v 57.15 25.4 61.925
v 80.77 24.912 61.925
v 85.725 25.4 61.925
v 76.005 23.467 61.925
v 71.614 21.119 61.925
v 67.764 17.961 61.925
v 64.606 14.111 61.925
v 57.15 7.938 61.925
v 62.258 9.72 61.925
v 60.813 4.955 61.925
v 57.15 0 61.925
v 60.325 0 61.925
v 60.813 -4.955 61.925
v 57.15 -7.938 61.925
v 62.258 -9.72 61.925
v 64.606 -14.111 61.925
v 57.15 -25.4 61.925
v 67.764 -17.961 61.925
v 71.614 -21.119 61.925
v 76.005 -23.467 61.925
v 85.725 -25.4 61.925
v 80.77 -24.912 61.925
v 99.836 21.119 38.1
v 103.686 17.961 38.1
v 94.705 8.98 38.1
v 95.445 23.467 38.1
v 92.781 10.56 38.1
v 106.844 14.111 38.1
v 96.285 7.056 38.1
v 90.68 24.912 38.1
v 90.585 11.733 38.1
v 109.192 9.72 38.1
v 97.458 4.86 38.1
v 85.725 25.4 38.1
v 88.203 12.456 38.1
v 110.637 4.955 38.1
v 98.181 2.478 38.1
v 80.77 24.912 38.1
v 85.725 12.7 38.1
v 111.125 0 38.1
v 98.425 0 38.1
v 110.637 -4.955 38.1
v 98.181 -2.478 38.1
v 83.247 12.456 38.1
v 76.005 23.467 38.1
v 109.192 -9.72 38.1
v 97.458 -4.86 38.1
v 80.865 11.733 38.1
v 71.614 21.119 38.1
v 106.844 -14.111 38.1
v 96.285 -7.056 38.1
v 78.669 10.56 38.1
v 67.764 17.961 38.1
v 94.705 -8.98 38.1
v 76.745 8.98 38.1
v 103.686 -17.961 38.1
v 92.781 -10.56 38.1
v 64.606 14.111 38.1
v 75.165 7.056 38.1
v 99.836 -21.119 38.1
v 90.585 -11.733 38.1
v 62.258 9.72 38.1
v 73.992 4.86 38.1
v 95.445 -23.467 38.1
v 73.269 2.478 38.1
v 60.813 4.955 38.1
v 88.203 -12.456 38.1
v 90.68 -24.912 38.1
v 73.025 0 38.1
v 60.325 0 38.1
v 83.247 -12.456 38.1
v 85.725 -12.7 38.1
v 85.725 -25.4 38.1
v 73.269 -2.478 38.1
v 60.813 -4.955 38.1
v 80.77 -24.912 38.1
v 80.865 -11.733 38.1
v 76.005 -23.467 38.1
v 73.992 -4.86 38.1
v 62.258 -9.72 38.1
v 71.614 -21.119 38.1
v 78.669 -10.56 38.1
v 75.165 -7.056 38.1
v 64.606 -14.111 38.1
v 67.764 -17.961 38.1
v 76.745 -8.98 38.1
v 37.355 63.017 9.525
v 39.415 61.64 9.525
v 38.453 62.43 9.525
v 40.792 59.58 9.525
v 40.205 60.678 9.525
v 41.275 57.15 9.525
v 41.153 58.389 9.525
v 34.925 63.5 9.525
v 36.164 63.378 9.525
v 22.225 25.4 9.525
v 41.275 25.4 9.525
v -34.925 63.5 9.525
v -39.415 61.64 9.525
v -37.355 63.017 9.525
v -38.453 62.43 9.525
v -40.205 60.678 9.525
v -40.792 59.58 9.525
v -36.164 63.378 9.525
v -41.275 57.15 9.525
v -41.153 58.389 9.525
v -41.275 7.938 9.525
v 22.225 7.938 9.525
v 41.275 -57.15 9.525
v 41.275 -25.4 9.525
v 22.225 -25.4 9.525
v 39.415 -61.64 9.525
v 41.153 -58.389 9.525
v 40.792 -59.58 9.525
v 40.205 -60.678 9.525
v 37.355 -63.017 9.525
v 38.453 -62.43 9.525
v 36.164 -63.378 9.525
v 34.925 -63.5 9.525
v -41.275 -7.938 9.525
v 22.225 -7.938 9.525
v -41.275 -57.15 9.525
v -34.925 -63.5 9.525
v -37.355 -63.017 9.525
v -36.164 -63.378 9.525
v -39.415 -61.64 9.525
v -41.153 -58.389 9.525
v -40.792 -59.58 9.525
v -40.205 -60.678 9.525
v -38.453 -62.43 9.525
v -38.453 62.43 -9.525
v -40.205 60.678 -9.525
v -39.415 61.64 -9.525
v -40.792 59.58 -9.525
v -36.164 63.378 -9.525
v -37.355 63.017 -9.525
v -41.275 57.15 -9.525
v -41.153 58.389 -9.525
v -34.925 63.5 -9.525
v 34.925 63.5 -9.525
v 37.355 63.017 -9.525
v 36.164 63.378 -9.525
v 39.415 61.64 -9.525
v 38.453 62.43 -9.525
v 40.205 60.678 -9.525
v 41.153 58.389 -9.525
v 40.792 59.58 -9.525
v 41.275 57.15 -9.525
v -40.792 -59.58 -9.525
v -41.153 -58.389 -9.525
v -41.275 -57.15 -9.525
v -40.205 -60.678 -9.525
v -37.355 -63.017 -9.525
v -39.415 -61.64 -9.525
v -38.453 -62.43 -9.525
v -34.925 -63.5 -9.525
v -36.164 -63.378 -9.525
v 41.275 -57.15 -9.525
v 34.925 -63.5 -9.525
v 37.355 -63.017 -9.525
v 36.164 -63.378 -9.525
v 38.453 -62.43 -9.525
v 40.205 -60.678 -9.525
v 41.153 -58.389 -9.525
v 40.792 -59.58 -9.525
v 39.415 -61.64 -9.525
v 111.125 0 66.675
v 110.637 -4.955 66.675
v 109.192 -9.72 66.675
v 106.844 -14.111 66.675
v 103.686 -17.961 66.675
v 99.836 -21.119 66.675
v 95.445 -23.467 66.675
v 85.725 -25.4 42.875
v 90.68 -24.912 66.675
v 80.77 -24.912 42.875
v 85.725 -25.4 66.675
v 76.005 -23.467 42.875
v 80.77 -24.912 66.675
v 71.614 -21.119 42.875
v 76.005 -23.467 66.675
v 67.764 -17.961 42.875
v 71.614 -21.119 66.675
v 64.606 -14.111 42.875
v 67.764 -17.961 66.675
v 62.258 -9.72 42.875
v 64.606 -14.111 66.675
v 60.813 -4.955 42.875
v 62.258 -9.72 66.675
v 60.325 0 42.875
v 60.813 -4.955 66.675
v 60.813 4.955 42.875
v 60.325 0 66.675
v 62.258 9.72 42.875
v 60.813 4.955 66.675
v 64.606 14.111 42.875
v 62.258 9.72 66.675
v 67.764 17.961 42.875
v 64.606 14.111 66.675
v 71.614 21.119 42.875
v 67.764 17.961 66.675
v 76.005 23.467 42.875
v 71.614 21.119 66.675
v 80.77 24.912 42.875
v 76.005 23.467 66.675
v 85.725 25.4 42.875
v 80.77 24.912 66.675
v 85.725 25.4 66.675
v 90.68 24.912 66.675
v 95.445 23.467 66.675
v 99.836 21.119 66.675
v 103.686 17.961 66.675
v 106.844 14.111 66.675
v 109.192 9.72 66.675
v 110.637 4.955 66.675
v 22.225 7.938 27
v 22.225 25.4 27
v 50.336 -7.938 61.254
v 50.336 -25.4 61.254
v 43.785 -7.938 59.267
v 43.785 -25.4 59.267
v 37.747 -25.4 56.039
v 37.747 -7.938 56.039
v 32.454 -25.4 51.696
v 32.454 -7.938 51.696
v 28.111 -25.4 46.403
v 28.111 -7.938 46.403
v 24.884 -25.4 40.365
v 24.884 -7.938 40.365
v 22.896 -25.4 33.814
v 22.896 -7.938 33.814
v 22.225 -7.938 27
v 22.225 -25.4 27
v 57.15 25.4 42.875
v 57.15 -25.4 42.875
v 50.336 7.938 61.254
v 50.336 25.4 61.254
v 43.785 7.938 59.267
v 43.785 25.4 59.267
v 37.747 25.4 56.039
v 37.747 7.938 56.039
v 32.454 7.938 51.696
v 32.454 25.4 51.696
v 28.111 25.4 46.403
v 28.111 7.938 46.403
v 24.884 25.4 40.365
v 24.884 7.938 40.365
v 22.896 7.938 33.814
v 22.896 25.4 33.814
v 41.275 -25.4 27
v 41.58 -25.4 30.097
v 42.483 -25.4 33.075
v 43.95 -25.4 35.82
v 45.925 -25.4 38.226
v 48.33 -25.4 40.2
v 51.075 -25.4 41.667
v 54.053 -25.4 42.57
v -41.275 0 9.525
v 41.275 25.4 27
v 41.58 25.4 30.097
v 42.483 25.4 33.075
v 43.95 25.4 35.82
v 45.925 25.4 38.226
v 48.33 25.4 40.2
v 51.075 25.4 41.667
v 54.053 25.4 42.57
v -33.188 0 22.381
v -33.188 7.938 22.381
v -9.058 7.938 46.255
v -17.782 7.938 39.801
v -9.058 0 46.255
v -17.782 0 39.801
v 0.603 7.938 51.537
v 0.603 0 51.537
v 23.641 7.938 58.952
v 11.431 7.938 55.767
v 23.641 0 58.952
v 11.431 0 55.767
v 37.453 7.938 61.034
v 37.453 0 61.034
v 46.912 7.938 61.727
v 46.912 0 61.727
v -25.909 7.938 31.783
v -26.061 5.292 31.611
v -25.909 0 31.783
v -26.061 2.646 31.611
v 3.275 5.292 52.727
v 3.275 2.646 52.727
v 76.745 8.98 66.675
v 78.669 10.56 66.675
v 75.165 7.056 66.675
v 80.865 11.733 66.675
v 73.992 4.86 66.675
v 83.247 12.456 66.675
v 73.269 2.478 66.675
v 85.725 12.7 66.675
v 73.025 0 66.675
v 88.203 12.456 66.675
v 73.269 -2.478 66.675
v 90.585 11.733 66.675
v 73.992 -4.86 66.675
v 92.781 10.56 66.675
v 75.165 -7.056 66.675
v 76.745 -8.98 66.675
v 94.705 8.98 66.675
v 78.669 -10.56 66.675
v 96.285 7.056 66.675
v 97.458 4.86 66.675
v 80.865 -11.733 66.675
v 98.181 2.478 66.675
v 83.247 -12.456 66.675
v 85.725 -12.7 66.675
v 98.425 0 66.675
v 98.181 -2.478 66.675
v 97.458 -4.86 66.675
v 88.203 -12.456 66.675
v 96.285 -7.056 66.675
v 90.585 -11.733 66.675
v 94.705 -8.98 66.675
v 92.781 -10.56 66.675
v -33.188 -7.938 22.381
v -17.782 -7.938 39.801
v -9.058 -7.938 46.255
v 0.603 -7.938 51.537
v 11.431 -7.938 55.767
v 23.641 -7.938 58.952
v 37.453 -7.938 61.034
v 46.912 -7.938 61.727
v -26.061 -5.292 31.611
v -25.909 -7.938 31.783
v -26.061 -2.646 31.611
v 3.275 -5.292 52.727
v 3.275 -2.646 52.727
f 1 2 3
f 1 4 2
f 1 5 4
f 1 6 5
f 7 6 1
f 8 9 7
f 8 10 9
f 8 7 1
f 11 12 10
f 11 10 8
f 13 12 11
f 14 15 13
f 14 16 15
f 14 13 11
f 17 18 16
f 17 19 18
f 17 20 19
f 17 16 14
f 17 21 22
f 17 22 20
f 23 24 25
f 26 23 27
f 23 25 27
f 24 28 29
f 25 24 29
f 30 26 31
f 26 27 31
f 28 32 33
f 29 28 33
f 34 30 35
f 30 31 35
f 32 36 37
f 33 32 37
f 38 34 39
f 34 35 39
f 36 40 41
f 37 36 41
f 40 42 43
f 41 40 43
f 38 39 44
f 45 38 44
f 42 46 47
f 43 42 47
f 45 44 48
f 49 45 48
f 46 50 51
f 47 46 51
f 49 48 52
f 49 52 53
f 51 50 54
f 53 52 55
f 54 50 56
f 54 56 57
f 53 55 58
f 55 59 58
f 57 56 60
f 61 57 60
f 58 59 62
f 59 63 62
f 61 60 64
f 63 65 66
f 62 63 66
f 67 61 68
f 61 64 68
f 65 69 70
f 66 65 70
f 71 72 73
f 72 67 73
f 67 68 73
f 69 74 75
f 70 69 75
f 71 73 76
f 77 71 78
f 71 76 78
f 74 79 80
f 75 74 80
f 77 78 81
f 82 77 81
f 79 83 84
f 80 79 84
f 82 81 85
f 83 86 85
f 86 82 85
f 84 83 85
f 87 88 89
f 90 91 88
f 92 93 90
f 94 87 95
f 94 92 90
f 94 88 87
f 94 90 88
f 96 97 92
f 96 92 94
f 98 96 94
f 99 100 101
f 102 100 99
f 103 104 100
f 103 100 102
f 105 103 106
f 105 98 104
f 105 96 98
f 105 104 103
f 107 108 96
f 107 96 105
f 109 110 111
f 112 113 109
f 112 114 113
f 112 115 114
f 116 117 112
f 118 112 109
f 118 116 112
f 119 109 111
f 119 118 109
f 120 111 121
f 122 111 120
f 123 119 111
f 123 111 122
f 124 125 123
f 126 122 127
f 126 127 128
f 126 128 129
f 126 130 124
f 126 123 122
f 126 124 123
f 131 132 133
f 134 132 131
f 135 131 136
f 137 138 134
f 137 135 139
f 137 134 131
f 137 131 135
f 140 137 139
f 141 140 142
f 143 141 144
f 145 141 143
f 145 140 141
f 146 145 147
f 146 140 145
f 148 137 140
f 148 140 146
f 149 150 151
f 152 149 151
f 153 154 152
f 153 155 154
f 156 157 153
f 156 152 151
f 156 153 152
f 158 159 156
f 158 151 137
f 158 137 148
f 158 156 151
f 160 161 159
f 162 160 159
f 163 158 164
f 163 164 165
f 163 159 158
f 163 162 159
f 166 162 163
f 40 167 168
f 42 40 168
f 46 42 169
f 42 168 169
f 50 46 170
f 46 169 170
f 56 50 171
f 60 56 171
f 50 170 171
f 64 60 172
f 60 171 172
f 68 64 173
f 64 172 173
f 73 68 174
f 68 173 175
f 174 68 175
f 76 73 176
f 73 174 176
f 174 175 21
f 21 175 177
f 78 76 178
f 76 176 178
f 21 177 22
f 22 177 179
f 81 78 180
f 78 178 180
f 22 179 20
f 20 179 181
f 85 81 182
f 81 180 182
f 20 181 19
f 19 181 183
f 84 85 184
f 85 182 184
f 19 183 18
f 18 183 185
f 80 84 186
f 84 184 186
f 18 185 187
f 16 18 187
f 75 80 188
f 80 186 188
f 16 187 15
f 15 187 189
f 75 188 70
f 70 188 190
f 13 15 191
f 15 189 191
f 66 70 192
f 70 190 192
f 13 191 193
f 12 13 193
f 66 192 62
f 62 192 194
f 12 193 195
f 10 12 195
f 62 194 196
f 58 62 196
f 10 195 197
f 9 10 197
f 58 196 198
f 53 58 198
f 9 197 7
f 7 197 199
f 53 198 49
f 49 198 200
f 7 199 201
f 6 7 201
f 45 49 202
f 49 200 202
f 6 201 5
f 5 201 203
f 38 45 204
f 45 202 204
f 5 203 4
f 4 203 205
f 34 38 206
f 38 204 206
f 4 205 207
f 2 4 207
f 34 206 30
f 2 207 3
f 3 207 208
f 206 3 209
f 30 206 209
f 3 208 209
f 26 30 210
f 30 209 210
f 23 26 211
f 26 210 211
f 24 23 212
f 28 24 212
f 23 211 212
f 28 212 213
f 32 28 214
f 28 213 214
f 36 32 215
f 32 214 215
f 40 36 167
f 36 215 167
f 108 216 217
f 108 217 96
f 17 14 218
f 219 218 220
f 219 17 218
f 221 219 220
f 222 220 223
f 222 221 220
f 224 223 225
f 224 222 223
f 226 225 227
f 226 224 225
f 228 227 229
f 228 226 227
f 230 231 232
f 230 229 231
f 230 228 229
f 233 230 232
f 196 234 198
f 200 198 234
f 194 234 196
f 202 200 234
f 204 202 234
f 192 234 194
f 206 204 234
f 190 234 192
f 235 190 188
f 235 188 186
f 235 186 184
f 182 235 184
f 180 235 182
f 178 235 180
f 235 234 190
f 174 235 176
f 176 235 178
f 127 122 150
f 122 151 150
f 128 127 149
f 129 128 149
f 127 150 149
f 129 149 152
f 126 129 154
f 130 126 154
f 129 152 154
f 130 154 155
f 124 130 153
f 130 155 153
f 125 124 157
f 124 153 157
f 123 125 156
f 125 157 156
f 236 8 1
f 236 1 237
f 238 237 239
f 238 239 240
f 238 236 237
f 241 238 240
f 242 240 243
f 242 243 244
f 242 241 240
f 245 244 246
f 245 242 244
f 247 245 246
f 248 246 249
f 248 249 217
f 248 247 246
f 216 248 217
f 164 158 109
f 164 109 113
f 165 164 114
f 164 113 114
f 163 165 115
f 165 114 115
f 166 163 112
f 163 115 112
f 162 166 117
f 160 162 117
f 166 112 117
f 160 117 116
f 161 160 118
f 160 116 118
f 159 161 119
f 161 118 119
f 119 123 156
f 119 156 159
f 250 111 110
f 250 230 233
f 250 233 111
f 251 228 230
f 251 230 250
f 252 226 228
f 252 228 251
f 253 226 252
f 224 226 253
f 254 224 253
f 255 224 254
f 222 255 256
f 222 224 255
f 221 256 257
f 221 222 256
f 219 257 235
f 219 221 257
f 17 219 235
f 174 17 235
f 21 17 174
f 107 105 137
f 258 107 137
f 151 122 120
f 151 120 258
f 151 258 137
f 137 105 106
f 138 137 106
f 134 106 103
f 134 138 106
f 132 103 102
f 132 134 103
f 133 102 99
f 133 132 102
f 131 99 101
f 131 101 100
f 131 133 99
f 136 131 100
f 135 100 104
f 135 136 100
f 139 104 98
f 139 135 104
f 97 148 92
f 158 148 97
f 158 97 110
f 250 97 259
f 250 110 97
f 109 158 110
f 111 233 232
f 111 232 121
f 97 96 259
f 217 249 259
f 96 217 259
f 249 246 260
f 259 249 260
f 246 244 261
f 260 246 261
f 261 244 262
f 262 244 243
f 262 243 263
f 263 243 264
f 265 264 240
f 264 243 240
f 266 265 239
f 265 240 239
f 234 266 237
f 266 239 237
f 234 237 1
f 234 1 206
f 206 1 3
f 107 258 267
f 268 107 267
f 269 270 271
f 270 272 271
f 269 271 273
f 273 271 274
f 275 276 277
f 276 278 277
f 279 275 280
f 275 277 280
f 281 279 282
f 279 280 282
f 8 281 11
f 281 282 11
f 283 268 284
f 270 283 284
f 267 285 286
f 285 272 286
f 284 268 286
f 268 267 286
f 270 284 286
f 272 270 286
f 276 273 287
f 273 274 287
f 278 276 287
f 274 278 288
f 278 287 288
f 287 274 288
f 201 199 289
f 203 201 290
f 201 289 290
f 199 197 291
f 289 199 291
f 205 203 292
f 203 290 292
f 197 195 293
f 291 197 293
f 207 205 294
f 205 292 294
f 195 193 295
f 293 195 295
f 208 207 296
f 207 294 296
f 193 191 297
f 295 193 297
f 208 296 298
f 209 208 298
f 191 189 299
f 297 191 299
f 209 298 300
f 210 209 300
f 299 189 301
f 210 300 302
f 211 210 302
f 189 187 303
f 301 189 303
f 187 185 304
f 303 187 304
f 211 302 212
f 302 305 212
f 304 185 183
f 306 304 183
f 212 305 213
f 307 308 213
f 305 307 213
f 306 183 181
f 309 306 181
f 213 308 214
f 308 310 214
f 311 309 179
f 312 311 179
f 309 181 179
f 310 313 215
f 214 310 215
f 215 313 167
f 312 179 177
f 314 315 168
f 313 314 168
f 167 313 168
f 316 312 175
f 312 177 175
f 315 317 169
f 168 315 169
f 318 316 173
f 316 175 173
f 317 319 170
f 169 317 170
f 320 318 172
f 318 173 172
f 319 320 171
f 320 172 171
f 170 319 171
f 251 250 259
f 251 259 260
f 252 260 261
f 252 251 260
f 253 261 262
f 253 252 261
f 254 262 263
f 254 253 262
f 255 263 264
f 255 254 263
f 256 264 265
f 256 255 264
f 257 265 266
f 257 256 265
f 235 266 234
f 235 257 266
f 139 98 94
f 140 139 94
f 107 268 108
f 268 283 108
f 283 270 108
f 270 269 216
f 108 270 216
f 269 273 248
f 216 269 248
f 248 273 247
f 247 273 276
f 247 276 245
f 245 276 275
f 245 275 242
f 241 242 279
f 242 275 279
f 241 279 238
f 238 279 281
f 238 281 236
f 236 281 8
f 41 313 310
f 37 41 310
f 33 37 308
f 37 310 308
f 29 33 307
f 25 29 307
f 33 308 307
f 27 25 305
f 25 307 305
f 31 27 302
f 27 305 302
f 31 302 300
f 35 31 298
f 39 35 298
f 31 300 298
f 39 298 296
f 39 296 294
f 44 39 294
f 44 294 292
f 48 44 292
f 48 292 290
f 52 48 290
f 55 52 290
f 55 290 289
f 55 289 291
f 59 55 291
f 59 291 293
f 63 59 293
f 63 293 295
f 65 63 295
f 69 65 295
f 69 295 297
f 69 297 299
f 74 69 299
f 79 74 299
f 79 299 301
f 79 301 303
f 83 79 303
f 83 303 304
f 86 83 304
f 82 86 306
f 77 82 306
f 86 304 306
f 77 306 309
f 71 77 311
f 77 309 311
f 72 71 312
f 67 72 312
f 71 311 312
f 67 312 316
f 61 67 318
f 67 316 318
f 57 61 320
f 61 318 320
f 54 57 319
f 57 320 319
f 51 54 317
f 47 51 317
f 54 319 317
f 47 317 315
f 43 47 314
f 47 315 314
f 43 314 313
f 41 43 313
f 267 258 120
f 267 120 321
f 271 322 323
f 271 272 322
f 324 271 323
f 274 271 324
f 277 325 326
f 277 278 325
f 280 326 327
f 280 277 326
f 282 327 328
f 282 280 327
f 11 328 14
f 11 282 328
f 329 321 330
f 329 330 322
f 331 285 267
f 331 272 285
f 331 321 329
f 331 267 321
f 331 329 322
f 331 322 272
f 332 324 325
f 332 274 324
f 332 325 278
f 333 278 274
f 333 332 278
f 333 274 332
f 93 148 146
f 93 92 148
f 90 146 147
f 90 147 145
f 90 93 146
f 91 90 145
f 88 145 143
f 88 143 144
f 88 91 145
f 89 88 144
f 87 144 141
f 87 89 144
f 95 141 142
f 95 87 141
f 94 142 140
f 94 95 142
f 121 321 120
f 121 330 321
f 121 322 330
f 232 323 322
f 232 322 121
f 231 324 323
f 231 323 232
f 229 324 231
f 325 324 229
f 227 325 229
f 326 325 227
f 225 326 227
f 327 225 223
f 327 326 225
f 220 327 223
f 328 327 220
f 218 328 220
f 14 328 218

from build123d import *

# Parameters (mm, degrees)
F1_DEPTH = 63.5
F0_W     = 25.4
F0_H     = 19.05
F2_DEPTH = 25.4
F3_DEPTH = 7.9375
F5_R     = 6.35
F6_R     = 12.7
F7_DEPTH = 76.201


with BuildPart() as f1:
    # F0 (on Front) → F1 (new body, symmetric)
    with BuildSketch(Plane.XZ):
        Polygon((41.275, -9.525), (41.275, 9.525), (22.225, 9.525), (-41.275, 9.525), (-41.275, -9.525), align=None)
    extrude(amount=F1_DEPTH, both=True)

    # F0 (on Front) → F2 (join, symmetric)
    with BuildSketch(Plane.XZ):
        with BuildLine():
            Line((22.225, 9.525), (41.275, 9.525))
            Line((41.275, 9.525), (41.275, 27.0002))
            ThreePointArc((41.275, 27.0002), (45.92468, 38.22552), (57.15, 42.8752))
            Line((57.15, 42.8752), (60.325, 42.8752))
            Line((60.325, 42.8752), (60.325, 61.9252))
            Line((60.325, 61.9252), (57.15, 61.9252))
            ThreePointArc((57.15, 61.9252), (32.454296, 51.695904), (22.225, 27.0002))
            Line((22.225, 27.0002), (22.225, 9.525))
        make_face()
        with Locations((73.025, 52.4002)):
            Rectangle(F0_W, F0_H)
    extrude(amount=F2_DEPTH, both=True)

    # F0 (on Front) → F3 (join, symmetric)
    with BuildSketch(Plane.XZ):
        with BuildLine():
            Line((-41.275, 9.525), (22.225, 9.525))
            Line((22.225, 9.525), (22.225, 27.0002))
            ThreePointArc((22.225, 27.0002), (32.454296, 51.695904), (57.15, 61.9252))
            add(Edge.make_bspline(
                [(-41.275, 9.525), (-29.649258, 28.44544), (-12.466568, 62.335622), (57.15, 61.9252)],
                knots=[0, 0, 0, 0, 111.504536, 111.504536, 111.504536, 111.504536], degree=3))
        make_face()
    extrude(amount=F3_DEPTH, both=True)

    # F0 (on Front) → F4 (revolve)
    with BuildSketch(Plane.XZ):
        Polygon((85.725, 61.9252), (85.725, 42.8752), (85.725, 38.1), (111.125, 38.1), (111.125, 66.675), (85.725, 66.675), align=None)
    revolve(axis=Axis((85.725, 0, 52.4002), (0, 0, -1)))

    # F5
    f5_edges = [f1.edges().sort_by_distance(p)[0] for p in [
        (41.275, -63.5, 0),
        (-41.275, -63.5, 0),
        (-41.275, 63.5, 0),
        (41.275, 63.5, 0),
    ]]
    fillet(f5_edges, radius=F5_R)

    # F6 (on face) → F7 (cut, through all)
    with BuildSketch(Plane.XY.offset(66.675)):
        with Locations((85.725, 0)):
            Circle(F6_R)
    extrude(amount=-F7_DEPTH, mode=Mode.SUBTRACT)


solid = f1.part
